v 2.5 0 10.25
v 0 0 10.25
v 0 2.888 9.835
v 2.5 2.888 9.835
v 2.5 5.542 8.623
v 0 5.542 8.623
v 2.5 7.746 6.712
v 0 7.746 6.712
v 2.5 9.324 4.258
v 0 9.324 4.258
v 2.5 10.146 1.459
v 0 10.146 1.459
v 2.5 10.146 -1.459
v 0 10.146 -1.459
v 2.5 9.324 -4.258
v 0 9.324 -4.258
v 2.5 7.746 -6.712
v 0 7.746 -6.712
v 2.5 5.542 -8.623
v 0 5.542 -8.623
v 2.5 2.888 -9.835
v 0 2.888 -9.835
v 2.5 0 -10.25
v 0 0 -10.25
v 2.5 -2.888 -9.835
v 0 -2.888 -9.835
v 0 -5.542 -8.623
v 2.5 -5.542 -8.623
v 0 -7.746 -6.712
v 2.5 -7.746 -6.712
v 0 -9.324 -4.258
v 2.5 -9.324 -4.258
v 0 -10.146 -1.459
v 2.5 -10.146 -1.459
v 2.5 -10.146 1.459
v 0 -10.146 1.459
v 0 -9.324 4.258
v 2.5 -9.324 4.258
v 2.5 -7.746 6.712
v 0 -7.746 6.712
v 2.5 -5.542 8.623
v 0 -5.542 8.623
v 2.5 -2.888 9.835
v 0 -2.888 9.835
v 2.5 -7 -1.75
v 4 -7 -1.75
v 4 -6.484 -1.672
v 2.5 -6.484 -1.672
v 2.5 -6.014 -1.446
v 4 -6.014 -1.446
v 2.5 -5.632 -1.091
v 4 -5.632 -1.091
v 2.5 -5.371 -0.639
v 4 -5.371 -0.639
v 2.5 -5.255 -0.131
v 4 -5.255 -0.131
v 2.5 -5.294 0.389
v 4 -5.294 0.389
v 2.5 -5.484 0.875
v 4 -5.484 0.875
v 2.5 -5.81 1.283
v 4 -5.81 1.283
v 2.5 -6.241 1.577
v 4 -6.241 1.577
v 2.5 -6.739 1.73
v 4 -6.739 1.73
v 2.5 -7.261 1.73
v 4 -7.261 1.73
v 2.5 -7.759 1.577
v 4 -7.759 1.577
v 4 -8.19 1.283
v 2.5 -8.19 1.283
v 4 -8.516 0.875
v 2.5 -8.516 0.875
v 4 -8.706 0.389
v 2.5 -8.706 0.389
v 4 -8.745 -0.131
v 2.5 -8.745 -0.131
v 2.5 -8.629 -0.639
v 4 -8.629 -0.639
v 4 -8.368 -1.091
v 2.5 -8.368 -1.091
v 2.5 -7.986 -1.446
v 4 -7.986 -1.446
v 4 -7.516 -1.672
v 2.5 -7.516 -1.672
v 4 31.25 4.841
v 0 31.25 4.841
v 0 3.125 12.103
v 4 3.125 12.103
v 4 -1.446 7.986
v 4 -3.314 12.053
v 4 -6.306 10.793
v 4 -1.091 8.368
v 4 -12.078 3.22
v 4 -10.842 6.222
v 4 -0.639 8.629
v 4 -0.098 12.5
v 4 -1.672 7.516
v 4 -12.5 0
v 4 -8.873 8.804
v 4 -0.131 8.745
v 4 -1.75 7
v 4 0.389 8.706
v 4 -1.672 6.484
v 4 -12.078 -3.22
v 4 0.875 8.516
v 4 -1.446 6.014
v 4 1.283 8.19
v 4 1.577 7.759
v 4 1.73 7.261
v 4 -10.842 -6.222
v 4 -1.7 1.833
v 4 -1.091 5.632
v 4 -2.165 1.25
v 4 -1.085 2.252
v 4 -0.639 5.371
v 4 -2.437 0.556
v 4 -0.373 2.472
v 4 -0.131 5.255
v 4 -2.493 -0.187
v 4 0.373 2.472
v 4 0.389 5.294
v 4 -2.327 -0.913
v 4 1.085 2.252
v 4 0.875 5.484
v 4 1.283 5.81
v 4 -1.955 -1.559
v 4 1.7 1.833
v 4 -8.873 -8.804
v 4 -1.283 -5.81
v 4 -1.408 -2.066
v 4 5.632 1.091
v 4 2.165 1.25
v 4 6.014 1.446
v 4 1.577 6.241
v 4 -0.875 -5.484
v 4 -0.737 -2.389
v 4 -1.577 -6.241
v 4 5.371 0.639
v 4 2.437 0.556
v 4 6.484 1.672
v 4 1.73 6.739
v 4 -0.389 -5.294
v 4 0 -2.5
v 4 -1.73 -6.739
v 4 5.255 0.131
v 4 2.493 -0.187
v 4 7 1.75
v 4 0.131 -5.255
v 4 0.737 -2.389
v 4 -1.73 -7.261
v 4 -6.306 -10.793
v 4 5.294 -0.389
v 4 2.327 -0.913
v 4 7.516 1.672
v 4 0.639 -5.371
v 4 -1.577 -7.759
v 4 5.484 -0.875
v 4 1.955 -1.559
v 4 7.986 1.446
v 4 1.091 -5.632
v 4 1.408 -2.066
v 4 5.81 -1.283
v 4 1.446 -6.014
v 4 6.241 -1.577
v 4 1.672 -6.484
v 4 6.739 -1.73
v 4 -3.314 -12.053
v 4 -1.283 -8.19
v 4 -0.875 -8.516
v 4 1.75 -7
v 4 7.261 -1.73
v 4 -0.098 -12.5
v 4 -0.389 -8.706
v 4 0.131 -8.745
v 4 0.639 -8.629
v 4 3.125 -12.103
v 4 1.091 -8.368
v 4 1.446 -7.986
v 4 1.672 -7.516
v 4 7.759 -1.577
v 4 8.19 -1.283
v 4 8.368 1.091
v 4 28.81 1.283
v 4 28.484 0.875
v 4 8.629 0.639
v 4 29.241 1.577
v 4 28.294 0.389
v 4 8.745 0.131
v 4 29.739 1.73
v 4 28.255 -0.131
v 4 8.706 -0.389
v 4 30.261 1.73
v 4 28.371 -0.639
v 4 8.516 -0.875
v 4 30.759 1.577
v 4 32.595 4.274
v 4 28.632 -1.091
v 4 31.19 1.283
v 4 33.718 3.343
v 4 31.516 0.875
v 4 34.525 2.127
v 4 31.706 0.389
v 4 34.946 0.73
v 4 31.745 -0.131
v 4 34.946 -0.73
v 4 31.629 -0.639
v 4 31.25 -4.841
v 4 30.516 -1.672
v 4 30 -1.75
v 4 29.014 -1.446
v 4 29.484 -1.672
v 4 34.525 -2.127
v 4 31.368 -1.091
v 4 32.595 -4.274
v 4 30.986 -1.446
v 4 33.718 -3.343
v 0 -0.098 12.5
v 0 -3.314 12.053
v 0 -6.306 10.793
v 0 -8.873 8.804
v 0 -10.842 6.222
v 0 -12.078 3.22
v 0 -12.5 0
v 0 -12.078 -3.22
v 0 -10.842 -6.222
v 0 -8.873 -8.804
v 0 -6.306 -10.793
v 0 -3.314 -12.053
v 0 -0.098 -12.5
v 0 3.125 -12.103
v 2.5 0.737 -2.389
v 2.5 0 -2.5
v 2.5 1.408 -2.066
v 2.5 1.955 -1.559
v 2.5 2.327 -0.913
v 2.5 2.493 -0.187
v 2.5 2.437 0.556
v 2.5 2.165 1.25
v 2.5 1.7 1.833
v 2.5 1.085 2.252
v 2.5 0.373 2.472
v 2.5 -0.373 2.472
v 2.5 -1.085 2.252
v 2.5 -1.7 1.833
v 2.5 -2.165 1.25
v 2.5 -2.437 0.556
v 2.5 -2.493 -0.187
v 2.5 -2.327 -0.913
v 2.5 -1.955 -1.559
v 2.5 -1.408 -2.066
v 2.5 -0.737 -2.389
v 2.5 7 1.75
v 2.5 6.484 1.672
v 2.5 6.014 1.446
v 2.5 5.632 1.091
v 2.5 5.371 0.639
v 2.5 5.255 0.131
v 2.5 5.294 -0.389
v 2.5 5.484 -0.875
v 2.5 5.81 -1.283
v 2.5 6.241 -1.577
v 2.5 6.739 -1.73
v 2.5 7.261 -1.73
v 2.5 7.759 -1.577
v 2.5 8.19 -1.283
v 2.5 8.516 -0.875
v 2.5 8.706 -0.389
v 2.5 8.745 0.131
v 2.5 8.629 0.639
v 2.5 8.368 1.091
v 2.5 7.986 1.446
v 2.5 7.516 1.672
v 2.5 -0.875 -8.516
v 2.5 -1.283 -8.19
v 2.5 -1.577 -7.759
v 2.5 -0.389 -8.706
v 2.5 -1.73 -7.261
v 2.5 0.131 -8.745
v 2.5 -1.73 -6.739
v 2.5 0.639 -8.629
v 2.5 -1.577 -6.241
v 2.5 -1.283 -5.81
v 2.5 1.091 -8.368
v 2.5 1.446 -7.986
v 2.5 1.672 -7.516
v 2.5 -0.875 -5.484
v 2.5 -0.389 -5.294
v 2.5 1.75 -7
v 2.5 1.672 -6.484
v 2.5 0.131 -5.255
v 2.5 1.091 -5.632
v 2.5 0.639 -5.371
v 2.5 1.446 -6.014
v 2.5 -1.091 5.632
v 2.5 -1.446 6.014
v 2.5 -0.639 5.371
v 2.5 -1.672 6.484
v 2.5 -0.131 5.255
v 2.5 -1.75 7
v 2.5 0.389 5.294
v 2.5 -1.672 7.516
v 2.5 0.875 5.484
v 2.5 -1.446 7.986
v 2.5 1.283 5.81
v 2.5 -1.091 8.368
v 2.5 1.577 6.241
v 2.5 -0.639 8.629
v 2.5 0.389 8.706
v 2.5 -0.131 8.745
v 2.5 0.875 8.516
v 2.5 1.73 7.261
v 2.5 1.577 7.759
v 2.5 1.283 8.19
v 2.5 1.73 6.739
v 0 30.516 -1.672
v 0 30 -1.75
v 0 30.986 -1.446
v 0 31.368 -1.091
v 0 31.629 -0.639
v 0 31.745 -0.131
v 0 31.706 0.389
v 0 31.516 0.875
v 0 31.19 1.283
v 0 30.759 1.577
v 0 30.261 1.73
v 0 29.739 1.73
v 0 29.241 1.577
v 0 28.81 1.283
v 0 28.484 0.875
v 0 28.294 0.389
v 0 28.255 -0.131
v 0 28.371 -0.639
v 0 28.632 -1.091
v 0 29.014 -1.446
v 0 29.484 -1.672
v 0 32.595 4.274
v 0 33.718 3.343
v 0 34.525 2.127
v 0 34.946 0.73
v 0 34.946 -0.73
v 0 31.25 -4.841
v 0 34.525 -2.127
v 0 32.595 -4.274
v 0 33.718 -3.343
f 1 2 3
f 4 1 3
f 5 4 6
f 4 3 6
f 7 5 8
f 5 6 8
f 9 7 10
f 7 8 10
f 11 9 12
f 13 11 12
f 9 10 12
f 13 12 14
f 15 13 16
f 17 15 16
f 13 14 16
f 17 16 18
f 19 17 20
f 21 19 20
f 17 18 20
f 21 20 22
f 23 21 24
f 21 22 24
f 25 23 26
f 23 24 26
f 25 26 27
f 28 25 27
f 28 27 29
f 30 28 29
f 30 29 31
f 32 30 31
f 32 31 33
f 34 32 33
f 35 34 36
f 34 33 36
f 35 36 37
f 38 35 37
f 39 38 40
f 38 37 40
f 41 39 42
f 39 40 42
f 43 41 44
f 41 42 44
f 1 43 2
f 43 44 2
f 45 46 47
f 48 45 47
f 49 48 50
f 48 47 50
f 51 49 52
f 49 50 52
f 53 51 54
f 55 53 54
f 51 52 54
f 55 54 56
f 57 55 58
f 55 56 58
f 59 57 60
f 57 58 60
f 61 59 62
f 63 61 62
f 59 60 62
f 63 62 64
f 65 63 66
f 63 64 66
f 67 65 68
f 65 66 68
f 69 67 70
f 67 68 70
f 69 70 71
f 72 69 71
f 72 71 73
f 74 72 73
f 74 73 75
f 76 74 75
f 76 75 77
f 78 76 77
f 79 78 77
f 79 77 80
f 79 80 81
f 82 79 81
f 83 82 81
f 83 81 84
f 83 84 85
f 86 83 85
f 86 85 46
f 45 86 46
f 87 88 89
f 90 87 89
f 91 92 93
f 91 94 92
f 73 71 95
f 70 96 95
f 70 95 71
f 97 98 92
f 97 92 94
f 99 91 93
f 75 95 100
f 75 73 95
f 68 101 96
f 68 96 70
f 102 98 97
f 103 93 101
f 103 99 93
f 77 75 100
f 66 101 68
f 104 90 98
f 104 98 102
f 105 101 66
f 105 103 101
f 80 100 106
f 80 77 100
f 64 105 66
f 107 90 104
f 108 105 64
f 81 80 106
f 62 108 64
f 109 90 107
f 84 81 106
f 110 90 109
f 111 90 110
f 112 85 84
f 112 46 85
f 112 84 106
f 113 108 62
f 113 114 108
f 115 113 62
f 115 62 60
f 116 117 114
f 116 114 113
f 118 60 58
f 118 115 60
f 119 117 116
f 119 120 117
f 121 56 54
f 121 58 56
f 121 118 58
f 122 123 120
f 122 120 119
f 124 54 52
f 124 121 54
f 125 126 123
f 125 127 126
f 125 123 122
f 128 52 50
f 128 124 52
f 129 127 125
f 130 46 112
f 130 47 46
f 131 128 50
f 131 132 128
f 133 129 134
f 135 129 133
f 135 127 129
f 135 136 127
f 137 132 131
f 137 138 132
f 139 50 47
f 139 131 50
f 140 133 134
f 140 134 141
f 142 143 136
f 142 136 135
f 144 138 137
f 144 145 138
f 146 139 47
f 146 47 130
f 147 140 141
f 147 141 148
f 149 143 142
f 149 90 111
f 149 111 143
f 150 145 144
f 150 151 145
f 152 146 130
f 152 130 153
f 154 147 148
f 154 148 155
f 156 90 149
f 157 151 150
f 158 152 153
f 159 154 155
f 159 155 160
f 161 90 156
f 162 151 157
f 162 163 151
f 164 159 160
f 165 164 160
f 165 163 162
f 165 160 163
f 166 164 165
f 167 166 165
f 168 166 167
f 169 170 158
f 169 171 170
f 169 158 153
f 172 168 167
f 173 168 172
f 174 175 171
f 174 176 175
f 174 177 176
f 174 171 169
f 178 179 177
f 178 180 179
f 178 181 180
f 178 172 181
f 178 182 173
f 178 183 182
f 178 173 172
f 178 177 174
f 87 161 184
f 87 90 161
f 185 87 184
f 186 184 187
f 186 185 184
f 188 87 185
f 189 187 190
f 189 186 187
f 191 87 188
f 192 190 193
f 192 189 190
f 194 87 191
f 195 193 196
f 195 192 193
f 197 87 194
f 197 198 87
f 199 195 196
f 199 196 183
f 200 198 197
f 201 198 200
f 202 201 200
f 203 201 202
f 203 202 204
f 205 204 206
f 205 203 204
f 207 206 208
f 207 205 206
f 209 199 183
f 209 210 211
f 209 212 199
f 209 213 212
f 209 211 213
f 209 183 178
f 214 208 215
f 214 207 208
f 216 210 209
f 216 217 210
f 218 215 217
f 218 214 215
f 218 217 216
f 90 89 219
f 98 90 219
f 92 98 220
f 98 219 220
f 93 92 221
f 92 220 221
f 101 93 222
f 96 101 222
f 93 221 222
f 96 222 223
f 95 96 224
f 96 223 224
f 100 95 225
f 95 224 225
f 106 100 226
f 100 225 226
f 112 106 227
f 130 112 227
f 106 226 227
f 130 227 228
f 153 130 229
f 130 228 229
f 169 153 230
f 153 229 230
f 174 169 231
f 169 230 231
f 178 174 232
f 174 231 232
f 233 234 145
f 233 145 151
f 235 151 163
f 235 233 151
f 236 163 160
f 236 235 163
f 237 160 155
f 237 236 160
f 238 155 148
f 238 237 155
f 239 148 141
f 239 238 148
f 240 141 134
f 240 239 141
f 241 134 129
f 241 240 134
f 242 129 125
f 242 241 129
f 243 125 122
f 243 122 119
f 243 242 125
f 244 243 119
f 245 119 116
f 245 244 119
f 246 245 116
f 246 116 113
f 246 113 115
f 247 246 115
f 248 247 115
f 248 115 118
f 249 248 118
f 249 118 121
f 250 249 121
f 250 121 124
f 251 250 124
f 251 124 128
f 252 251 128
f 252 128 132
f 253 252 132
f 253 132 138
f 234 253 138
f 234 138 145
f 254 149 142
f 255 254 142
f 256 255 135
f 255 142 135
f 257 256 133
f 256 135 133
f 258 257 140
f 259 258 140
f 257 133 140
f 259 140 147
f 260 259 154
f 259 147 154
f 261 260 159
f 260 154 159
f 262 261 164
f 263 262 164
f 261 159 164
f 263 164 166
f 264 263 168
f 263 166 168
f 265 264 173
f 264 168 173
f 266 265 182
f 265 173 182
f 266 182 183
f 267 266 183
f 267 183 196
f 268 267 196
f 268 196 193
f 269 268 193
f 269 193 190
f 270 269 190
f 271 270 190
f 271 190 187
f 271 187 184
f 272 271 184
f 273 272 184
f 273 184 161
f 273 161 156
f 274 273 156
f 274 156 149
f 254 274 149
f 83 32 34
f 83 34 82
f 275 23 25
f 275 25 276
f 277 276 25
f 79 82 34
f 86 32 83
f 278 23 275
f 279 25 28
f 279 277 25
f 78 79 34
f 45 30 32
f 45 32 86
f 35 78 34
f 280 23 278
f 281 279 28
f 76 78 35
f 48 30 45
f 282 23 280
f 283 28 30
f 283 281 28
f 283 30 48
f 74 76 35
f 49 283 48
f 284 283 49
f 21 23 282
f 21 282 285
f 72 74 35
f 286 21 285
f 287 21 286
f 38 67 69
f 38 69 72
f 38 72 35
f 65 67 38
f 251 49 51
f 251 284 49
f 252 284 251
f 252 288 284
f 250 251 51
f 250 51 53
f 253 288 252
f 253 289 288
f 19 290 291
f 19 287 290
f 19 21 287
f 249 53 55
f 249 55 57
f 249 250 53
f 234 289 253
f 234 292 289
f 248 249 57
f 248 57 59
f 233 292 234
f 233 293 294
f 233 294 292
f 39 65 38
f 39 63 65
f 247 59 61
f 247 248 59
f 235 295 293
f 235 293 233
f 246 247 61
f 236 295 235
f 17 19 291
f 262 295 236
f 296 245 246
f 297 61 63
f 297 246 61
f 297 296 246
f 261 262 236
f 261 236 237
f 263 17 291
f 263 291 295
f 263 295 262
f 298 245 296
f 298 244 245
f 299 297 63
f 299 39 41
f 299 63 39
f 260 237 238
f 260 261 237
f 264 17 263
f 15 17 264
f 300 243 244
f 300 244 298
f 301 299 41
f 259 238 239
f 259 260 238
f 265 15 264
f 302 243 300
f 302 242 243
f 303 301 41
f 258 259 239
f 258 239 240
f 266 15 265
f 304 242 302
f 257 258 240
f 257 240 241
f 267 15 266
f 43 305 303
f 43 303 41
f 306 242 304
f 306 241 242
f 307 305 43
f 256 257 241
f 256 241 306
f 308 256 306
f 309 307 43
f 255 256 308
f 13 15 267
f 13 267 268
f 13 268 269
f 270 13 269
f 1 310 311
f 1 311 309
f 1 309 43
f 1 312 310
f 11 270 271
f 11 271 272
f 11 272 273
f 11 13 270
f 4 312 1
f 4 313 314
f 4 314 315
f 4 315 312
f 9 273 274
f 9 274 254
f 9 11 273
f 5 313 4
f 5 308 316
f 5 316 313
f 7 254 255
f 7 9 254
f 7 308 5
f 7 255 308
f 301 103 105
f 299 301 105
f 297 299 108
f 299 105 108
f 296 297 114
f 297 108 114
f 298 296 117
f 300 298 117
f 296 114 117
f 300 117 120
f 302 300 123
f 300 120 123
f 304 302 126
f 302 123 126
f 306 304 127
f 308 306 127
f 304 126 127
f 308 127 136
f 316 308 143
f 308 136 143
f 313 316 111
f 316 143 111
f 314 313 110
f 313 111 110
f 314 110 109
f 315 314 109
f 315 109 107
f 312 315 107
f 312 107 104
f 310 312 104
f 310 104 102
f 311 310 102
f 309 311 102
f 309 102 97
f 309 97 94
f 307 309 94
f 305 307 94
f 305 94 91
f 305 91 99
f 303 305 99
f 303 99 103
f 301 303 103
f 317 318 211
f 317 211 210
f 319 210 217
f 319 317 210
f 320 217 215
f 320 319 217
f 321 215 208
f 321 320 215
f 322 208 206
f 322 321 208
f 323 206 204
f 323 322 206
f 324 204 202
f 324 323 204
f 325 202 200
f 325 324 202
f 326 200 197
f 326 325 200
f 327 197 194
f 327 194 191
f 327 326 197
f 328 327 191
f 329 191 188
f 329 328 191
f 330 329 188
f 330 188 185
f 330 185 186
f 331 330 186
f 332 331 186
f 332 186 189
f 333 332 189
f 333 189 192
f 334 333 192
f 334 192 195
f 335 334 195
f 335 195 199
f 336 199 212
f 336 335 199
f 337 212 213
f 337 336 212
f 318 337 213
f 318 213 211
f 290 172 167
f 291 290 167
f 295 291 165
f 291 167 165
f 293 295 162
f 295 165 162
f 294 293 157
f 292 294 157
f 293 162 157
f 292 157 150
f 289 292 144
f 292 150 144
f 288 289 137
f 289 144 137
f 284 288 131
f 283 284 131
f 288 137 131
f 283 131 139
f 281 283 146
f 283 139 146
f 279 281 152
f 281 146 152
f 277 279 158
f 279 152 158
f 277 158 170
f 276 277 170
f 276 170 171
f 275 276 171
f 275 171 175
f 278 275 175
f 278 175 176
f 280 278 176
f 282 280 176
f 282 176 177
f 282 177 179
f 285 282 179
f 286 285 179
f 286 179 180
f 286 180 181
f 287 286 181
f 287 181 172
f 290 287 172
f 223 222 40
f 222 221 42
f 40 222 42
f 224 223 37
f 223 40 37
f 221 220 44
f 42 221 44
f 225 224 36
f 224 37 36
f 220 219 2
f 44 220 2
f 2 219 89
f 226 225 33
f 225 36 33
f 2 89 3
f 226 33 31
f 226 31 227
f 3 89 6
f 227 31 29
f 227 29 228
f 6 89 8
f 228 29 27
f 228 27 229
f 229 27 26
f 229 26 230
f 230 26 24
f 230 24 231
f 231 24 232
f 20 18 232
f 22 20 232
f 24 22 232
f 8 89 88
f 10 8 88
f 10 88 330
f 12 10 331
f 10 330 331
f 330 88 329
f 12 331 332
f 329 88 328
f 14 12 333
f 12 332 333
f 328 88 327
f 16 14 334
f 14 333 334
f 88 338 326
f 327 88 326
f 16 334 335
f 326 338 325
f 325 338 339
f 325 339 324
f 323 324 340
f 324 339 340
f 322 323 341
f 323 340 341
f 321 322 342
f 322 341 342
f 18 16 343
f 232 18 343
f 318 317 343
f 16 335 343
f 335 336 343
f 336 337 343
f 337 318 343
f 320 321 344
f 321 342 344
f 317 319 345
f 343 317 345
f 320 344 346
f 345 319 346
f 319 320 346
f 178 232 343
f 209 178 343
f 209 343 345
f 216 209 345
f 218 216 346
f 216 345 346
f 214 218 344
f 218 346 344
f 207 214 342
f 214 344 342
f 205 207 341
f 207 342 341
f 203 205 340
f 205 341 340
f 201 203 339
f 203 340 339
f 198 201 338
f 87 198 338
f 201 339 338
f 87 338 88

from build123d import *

# Parameters (mm, degrees)
SKETCH_1_R               = 1.75
SKETCH_1_R_2             = 2.5
EXTRUDE_1_DEPTH          = 4
SKETCH_2_R               = 1.75
CUT_EXTRUDE_1_DEPTH      = 4
PATTERN_CIRCULAR_1_COUNT = 4
SKETCH_4_R               = 10.25
CUT_EXTRUDE_2_DEPTH      = 2.5


with BuildPart() as part:
    # 草图1 → 凸台-拉伸1 (new body)
    with BuildSketch(Plane(origin=(0, 0, 0), x_dir=(0, 0, -1), z_dir=(1, 0, 0))):
        with BuildLine():
            Line((-4.841229183, 31.25), (-12.103072957, 3.125))
            ThreePointArc((-12.103072957, 3.125), (0, -12.5), (12.103072957, 3.125))
            Line((12.103072957, 3.125), (4.841229183, 31.25))
            ThreePointArc((4.841229183, 31.25), (0, 35), (-4.841229183, 31.25))
        make_face()
        with Locations((0, 30)):
            Circle(SKETCH_1_R, mode=Mode.SUBTRACT)
        Circle(SKETCH_1_R_2, mode=Mode.SUBTRACT)
    extrude(amount=EXTRUDE_1_DEPTH)

    # 草图2 → 切除-拉伸1 (cut)
    with BuildSketch(Plane(origin=(4, 0, 0), x_dir=(0, 0, -1), z_dir=(1, 0, 0))):
        with Locations((0, -7)):
            Circle(SKETCH_2_R)
    cut_extrude_1 = extrude(amount=-CUT_EXTRUDE_1_DEPTH, mode=Mode.SUBTRACT)

    # 阵列(圆周)1: 切除-拉伸1 ×4 about axis
    pattern_circular_1_axis = Axis((0, 0, 0), (1, 0, 0))
    for i in range(1, PATTERN_CIRCULAR_1_COUNT):
        add(cut_extrude_1.rotate(pattern_circular_1_axis, i * 360 / PATTERN_CIRCULAR_1_COUNT), mode=Mode.SUBTRACT)

    # 草图4 → 切除-拉伸2 (cut)
    with BuildSketch(Plane.ZY):
        Circle(SKETCH_4_R)
    extrude(amount=-CUT_EXTRUDE_2_DEPTH, mode=Mode.SUBTRACT)


solid = part.part
